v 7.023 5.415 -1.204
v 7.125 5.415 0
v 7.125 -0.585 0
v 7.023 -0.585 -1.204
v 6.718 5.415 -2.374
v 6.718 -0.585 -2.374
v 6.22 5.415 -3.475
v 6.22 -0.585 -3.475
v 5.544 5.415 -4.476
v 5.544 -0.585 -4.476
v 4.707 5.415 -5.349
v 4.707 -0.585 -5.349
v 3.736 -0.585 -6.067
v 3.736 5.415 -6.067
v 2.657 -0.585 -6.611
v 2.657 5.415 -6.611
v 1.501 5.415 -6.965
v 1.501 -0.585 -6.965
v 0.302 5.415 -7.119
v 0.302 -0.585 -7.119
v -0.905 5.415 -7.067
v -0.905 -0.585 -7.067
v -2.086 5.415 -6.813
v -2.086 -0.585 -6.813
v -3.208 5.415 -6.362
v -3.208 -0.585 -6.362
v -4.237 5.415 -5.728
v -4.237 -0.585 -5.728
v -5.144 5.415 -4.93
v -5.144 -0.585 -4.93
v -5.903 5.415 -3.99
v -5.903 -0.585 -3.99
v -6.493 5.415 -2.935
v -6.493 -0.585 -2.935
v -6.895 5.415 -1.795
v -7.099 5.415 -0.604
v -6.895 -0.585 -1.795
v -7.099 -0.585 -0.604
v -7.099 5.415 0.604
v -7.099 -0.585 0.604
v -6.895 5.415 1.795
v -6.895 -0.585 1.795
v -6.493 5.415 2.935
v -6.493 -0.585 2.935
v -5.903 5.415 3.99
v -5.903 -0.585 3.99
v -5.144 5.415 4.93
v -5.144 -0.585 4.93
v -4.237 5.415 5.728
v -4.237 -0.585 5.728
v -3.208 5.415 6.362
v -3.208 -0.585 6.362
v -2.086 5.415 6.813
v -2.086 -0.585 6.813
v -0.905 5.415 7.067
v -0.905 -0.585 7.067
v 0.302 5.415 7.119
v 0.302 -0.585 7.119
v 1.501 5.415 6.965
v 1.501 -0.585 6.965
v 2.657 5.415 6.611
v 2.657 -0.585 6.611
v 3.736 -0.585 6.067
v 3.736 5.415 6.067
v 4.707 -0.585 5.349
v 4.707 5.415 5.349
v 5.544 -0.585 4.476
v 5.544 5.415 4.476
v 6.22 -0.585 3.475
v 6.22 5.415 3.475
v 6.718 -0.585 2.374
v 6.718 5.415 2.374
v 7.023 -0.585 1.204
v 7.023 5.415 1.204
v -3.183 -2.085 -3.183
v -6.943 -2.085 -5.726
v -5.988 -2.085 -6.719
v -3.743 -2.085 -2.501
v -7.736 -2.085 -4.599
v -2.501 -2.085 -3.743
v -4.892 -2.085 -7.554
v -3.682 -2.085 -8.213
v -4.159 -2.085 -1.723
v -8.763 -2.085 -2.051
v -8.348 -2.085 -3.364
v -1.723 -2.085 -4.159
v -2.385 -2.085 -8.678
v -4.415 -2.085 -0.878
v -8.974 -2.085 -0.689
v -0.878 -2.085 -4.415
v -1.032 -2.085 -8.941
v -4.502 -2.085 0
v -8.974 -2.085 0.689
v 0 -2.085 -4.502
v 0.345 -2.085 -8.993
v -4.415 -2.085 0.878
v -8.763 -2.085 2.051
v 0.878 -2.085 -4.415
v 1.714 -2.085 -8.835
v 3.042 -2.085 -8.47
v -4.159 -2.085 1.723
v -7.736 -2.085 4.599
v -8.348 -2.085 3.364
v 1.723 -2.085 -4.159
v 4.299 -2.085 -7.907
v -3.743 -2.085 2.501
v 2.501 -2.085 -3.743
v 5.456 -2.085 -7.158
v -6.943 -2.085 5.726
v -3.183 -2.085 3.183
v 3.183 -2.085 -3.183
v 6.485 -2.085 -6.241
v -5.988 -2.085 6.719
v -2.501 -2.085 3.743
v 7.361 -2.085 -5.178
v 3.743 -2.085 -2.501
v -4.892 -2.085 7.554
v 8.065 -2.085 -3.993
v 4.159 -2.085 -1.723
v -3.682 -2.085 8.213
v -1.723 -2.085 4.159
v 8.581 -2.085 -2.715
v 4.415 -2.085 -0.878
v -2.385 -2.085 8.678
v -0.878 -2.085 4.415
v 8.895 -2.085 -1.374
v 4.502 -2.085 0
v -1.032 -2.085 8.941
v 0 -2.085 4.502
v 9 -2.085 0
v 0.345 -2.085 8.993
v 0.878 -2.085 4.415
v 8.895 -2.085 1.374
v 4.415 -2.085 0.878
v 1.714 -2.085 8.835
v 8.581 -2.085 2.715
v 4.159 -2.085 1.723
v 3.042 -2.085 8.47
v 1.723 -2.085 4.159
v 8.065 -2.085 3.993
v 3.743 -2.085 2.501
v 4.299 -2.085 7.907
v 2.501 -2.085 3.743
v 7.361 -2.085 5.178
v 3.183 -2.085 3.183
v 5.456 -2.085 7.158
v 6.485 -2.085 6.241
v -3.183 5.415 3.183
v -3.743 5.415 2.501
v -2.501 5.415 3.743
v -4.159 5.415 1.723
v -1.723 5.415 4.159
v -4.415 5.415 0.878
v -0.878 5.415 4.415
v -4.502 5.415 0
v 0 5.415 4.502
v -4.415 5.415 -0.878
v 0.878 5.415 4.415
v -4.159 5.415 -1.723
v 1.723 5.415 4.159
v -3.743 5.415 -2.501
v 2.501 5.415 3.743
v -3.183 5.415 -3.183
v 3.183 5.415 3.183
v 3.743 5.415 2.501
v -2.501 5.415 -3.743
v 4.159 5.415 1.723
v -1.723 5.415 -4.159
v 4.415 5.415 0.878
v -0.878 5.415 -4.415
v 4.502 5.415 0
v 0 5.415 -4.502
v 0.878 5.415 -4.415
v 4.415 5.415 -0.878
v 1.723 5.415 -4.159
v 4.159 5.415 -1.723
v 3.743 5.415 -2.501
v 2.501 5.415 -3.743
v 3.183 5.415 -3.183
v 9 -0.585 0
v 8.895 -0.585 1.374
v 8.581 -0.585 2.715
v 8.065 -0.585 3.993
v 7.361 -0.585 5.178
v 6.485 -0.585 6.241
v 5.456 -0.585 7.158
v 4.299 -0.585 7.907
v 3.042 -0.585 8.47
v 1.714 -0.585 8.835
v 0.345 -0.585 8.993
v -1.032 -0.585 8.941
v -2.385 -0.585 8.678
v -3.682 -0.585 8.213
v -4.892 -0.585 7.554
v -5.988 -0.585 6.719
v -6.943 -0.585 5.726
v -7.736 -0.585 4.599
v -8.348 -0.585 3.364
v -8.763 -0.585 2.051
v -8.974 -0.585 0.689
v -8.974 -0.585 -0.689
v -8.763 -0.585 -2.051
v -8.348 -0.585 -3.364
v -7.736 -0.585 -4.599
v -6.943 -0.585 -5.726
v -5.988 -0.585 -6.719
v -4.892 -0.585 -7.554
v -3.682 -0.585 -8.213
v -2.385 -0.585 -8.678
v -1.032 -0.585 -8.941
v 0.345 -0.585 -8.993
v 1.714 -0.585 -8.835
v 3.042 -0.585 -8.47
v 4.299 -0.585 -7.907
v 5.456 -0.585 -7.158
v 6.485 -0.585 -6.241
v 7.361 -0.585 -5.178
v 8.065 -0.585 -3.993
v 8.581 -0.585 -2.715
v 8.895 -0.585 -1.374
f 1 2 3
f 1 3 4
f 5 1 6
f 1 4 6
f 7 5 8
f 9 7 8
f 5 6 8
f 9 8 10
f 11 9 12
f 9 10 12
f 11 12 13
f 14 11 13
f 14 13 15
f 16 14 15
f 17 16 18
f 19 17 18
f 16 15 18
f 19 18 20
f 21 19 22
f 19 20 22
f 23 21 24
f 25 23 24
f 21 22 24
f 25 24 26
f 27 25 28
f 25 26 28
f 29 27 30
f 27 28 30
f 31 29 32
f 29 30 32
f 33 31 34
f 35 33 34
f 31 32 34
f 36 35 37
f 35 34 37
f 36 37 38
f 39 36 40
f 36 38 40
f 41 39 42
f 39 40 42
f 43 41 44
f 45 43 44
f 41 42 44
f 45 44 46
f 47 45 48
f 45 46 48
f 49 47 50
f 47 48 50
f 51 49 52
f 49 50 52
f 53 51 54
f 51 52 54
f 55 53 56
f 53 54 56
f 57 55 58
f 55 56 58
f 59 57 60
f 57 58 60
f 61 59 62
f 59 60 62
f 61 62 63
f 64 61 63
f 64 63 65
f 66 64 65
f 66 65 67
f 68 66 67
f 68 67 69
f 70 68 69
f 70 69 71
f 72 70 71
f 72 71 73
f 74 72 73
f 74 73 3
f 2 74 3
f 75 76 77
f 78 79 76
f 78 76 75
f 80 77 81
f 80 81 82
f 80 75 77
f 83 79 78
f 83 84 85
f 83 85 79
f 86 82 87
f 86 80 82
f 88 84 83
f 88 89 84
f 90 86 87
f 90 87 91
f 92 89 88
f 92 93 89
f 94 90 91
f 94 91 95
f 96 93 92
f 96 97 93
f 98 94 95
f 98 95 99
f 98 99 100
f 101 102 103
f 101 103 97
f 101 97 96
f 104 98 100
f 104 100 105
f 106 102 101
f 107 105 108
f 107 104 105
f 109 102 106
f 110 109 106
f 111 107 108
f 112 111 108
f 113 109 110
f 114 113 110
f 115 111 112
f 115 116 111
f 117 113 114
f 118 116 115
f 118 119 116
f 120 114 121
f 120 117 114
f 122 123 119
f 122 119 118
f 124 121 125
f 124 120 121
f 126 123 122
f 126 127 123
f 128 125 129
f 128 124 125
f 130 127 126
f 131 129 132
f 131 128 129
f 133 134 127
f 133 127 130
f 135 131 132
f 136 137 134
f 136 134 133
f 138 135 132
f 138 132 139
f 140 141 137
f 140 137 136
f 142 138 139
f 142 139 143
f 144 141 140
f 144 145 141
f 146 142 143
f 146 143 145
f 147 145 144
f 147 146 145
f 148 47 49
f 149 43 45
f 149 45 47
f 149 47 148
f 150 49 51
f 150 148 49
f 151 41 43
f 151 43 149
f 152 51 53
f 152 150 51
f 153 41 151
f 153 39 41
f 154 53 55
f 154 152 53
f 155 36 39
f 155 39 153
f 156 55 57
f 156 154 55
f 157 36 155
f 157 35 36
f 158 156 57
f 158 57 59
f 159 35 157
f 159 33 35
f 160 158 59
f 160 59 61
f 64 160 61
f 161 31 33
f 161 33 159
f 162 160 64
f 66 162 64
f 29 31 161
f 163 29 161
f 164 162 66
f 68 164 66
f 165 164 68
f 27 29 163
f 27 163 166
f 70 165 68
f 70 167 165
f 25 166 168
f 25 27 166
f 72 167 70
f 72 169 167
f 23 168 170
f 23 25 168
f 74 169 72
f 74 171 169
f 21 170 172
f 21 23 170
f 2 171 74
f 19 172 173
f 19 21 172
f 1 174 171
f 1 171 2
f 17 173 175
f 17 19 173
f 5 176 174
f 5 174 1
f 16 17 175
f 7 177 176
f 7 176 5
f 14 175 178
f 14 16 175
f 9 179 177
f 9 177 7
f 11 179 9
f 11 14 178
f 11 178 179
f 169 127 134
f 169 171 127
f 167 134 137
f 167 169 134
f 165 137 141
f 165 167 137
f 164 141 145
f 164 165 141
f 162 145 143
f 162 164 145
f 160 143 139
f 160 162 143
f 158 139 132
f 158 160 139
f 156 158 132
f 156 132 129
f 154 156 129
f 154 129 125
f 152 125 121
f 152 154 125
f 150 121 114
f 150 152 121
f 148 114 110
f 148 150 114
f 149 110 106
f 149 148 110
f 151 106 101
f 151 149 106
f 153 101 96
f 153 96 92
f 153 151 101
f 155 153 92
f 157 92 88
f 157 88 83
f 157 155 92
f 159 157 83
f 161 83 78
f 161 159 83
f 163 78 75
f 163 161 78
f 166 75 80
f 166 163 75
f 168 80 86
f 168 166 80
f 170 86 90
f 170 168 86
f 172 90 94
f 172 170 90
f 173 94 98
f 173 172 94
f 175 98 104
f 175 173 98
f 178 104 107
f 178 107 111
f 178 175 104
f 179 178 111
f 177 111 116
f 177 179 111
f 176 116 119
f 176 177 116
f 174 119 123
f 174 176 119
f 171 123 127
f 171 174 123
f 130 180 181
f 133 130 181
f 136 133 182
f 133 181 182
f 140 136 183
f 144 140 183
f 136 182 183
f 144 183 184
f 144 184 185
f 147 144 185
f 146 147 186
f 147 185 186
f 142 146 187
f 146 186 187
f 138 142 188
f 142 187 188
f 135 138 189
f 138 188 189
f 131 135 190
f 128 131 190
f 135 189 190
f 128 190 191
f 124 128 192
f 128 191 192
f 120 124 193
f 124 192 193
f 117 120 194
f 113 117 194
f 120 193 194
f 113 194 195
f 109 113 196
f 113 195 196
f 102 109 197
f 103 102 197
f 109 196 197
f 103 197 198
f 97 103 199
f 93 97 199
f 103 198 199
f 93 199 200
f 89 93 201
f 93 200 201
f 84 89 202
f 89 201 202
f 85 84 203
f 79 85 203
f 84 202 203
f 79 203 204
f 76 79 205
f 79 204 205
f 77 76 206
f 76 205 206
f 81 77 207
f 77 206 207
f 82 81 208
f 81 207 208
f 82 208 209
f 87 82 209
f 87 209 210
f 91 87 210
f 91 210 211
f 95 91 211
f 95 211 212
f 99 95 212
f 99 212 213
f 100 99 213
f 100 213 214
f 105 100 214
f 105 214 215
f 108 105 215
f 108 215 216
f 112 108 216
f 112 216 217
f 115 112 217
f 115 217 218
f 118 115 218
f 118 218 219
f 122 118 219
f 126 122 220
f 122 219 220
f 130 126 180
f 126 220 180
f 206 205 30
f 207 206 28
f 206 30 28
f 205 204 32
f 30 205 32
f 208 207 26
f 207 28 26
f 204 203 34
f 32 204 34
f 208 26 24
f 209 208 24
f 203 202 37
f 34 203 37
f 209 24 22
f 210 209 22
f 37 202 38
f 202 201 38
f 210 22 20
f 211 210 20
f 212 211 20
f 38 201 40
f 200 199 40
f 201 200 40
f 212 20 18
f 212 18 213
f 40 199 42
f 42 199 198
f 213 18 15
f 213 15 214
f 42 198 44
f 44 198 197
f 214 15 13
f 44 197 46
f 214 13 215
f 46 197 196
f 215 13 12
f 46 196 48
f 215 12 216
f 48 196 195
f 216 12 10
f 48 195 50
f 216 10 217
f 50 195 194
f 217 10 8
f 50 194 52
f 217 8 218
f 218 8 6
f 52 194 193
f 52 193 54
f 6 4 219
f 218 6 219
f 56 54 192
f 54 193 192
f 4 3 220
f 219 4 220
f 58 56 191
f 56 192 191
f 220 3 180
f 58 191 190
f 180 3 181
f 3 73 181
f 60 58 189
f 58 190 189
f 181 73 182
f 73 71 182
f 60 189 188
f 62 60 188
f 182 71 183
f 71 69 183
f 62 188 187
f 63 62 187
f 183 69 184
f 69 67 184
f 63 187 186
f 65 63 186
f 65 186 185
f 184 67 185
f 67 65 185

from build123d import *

# Parameters (mm, degrees)
SKETCH1_R           = 4.75
SKETCH1_R_2         = 3.001
BOSS_EXTRUDE1_DEPTH = 4
SKETCH2_R           = 6
SKETCH2_R_2         = 3.001
BOSS_EXTRUDE2_DEPTH = 1
SCALE1_SCALE        = 1.5


with BuildPart() as part:
    # Sketch1 → Boss-Extrude1 (new body)
    with BuildSketch(Plane(origin=(0, 0, 0), x_dir=(1, 0, 0), z_dir=(0, 1, 0))):
        Circle(SKETCH1_R)
        Circle(SKETCH1_R_2, mode=Mode.SUBTRACT)
    extrude(amount=BOSS_EXTRUDE1_DEPTH)

    # Sketch2 → Boss-Extrude2 (add)
    with BuildSketch(Plane.XZ):
        Circle(SKETCH2_R)
        Circle(SKETCH2_R_2, mode=Mode.SUBTRACT)
    extrude(amount=BOSS_EXTRUDE2_DEPTH)


with BuildPart() as part_1:
    # Scale1: scaled about (0, 1.169108574, 0)
    add(part.part.scale(SCALE1_SCALE).moved(Location((0, -0.584554287, 0))))


solid = part_1.part
